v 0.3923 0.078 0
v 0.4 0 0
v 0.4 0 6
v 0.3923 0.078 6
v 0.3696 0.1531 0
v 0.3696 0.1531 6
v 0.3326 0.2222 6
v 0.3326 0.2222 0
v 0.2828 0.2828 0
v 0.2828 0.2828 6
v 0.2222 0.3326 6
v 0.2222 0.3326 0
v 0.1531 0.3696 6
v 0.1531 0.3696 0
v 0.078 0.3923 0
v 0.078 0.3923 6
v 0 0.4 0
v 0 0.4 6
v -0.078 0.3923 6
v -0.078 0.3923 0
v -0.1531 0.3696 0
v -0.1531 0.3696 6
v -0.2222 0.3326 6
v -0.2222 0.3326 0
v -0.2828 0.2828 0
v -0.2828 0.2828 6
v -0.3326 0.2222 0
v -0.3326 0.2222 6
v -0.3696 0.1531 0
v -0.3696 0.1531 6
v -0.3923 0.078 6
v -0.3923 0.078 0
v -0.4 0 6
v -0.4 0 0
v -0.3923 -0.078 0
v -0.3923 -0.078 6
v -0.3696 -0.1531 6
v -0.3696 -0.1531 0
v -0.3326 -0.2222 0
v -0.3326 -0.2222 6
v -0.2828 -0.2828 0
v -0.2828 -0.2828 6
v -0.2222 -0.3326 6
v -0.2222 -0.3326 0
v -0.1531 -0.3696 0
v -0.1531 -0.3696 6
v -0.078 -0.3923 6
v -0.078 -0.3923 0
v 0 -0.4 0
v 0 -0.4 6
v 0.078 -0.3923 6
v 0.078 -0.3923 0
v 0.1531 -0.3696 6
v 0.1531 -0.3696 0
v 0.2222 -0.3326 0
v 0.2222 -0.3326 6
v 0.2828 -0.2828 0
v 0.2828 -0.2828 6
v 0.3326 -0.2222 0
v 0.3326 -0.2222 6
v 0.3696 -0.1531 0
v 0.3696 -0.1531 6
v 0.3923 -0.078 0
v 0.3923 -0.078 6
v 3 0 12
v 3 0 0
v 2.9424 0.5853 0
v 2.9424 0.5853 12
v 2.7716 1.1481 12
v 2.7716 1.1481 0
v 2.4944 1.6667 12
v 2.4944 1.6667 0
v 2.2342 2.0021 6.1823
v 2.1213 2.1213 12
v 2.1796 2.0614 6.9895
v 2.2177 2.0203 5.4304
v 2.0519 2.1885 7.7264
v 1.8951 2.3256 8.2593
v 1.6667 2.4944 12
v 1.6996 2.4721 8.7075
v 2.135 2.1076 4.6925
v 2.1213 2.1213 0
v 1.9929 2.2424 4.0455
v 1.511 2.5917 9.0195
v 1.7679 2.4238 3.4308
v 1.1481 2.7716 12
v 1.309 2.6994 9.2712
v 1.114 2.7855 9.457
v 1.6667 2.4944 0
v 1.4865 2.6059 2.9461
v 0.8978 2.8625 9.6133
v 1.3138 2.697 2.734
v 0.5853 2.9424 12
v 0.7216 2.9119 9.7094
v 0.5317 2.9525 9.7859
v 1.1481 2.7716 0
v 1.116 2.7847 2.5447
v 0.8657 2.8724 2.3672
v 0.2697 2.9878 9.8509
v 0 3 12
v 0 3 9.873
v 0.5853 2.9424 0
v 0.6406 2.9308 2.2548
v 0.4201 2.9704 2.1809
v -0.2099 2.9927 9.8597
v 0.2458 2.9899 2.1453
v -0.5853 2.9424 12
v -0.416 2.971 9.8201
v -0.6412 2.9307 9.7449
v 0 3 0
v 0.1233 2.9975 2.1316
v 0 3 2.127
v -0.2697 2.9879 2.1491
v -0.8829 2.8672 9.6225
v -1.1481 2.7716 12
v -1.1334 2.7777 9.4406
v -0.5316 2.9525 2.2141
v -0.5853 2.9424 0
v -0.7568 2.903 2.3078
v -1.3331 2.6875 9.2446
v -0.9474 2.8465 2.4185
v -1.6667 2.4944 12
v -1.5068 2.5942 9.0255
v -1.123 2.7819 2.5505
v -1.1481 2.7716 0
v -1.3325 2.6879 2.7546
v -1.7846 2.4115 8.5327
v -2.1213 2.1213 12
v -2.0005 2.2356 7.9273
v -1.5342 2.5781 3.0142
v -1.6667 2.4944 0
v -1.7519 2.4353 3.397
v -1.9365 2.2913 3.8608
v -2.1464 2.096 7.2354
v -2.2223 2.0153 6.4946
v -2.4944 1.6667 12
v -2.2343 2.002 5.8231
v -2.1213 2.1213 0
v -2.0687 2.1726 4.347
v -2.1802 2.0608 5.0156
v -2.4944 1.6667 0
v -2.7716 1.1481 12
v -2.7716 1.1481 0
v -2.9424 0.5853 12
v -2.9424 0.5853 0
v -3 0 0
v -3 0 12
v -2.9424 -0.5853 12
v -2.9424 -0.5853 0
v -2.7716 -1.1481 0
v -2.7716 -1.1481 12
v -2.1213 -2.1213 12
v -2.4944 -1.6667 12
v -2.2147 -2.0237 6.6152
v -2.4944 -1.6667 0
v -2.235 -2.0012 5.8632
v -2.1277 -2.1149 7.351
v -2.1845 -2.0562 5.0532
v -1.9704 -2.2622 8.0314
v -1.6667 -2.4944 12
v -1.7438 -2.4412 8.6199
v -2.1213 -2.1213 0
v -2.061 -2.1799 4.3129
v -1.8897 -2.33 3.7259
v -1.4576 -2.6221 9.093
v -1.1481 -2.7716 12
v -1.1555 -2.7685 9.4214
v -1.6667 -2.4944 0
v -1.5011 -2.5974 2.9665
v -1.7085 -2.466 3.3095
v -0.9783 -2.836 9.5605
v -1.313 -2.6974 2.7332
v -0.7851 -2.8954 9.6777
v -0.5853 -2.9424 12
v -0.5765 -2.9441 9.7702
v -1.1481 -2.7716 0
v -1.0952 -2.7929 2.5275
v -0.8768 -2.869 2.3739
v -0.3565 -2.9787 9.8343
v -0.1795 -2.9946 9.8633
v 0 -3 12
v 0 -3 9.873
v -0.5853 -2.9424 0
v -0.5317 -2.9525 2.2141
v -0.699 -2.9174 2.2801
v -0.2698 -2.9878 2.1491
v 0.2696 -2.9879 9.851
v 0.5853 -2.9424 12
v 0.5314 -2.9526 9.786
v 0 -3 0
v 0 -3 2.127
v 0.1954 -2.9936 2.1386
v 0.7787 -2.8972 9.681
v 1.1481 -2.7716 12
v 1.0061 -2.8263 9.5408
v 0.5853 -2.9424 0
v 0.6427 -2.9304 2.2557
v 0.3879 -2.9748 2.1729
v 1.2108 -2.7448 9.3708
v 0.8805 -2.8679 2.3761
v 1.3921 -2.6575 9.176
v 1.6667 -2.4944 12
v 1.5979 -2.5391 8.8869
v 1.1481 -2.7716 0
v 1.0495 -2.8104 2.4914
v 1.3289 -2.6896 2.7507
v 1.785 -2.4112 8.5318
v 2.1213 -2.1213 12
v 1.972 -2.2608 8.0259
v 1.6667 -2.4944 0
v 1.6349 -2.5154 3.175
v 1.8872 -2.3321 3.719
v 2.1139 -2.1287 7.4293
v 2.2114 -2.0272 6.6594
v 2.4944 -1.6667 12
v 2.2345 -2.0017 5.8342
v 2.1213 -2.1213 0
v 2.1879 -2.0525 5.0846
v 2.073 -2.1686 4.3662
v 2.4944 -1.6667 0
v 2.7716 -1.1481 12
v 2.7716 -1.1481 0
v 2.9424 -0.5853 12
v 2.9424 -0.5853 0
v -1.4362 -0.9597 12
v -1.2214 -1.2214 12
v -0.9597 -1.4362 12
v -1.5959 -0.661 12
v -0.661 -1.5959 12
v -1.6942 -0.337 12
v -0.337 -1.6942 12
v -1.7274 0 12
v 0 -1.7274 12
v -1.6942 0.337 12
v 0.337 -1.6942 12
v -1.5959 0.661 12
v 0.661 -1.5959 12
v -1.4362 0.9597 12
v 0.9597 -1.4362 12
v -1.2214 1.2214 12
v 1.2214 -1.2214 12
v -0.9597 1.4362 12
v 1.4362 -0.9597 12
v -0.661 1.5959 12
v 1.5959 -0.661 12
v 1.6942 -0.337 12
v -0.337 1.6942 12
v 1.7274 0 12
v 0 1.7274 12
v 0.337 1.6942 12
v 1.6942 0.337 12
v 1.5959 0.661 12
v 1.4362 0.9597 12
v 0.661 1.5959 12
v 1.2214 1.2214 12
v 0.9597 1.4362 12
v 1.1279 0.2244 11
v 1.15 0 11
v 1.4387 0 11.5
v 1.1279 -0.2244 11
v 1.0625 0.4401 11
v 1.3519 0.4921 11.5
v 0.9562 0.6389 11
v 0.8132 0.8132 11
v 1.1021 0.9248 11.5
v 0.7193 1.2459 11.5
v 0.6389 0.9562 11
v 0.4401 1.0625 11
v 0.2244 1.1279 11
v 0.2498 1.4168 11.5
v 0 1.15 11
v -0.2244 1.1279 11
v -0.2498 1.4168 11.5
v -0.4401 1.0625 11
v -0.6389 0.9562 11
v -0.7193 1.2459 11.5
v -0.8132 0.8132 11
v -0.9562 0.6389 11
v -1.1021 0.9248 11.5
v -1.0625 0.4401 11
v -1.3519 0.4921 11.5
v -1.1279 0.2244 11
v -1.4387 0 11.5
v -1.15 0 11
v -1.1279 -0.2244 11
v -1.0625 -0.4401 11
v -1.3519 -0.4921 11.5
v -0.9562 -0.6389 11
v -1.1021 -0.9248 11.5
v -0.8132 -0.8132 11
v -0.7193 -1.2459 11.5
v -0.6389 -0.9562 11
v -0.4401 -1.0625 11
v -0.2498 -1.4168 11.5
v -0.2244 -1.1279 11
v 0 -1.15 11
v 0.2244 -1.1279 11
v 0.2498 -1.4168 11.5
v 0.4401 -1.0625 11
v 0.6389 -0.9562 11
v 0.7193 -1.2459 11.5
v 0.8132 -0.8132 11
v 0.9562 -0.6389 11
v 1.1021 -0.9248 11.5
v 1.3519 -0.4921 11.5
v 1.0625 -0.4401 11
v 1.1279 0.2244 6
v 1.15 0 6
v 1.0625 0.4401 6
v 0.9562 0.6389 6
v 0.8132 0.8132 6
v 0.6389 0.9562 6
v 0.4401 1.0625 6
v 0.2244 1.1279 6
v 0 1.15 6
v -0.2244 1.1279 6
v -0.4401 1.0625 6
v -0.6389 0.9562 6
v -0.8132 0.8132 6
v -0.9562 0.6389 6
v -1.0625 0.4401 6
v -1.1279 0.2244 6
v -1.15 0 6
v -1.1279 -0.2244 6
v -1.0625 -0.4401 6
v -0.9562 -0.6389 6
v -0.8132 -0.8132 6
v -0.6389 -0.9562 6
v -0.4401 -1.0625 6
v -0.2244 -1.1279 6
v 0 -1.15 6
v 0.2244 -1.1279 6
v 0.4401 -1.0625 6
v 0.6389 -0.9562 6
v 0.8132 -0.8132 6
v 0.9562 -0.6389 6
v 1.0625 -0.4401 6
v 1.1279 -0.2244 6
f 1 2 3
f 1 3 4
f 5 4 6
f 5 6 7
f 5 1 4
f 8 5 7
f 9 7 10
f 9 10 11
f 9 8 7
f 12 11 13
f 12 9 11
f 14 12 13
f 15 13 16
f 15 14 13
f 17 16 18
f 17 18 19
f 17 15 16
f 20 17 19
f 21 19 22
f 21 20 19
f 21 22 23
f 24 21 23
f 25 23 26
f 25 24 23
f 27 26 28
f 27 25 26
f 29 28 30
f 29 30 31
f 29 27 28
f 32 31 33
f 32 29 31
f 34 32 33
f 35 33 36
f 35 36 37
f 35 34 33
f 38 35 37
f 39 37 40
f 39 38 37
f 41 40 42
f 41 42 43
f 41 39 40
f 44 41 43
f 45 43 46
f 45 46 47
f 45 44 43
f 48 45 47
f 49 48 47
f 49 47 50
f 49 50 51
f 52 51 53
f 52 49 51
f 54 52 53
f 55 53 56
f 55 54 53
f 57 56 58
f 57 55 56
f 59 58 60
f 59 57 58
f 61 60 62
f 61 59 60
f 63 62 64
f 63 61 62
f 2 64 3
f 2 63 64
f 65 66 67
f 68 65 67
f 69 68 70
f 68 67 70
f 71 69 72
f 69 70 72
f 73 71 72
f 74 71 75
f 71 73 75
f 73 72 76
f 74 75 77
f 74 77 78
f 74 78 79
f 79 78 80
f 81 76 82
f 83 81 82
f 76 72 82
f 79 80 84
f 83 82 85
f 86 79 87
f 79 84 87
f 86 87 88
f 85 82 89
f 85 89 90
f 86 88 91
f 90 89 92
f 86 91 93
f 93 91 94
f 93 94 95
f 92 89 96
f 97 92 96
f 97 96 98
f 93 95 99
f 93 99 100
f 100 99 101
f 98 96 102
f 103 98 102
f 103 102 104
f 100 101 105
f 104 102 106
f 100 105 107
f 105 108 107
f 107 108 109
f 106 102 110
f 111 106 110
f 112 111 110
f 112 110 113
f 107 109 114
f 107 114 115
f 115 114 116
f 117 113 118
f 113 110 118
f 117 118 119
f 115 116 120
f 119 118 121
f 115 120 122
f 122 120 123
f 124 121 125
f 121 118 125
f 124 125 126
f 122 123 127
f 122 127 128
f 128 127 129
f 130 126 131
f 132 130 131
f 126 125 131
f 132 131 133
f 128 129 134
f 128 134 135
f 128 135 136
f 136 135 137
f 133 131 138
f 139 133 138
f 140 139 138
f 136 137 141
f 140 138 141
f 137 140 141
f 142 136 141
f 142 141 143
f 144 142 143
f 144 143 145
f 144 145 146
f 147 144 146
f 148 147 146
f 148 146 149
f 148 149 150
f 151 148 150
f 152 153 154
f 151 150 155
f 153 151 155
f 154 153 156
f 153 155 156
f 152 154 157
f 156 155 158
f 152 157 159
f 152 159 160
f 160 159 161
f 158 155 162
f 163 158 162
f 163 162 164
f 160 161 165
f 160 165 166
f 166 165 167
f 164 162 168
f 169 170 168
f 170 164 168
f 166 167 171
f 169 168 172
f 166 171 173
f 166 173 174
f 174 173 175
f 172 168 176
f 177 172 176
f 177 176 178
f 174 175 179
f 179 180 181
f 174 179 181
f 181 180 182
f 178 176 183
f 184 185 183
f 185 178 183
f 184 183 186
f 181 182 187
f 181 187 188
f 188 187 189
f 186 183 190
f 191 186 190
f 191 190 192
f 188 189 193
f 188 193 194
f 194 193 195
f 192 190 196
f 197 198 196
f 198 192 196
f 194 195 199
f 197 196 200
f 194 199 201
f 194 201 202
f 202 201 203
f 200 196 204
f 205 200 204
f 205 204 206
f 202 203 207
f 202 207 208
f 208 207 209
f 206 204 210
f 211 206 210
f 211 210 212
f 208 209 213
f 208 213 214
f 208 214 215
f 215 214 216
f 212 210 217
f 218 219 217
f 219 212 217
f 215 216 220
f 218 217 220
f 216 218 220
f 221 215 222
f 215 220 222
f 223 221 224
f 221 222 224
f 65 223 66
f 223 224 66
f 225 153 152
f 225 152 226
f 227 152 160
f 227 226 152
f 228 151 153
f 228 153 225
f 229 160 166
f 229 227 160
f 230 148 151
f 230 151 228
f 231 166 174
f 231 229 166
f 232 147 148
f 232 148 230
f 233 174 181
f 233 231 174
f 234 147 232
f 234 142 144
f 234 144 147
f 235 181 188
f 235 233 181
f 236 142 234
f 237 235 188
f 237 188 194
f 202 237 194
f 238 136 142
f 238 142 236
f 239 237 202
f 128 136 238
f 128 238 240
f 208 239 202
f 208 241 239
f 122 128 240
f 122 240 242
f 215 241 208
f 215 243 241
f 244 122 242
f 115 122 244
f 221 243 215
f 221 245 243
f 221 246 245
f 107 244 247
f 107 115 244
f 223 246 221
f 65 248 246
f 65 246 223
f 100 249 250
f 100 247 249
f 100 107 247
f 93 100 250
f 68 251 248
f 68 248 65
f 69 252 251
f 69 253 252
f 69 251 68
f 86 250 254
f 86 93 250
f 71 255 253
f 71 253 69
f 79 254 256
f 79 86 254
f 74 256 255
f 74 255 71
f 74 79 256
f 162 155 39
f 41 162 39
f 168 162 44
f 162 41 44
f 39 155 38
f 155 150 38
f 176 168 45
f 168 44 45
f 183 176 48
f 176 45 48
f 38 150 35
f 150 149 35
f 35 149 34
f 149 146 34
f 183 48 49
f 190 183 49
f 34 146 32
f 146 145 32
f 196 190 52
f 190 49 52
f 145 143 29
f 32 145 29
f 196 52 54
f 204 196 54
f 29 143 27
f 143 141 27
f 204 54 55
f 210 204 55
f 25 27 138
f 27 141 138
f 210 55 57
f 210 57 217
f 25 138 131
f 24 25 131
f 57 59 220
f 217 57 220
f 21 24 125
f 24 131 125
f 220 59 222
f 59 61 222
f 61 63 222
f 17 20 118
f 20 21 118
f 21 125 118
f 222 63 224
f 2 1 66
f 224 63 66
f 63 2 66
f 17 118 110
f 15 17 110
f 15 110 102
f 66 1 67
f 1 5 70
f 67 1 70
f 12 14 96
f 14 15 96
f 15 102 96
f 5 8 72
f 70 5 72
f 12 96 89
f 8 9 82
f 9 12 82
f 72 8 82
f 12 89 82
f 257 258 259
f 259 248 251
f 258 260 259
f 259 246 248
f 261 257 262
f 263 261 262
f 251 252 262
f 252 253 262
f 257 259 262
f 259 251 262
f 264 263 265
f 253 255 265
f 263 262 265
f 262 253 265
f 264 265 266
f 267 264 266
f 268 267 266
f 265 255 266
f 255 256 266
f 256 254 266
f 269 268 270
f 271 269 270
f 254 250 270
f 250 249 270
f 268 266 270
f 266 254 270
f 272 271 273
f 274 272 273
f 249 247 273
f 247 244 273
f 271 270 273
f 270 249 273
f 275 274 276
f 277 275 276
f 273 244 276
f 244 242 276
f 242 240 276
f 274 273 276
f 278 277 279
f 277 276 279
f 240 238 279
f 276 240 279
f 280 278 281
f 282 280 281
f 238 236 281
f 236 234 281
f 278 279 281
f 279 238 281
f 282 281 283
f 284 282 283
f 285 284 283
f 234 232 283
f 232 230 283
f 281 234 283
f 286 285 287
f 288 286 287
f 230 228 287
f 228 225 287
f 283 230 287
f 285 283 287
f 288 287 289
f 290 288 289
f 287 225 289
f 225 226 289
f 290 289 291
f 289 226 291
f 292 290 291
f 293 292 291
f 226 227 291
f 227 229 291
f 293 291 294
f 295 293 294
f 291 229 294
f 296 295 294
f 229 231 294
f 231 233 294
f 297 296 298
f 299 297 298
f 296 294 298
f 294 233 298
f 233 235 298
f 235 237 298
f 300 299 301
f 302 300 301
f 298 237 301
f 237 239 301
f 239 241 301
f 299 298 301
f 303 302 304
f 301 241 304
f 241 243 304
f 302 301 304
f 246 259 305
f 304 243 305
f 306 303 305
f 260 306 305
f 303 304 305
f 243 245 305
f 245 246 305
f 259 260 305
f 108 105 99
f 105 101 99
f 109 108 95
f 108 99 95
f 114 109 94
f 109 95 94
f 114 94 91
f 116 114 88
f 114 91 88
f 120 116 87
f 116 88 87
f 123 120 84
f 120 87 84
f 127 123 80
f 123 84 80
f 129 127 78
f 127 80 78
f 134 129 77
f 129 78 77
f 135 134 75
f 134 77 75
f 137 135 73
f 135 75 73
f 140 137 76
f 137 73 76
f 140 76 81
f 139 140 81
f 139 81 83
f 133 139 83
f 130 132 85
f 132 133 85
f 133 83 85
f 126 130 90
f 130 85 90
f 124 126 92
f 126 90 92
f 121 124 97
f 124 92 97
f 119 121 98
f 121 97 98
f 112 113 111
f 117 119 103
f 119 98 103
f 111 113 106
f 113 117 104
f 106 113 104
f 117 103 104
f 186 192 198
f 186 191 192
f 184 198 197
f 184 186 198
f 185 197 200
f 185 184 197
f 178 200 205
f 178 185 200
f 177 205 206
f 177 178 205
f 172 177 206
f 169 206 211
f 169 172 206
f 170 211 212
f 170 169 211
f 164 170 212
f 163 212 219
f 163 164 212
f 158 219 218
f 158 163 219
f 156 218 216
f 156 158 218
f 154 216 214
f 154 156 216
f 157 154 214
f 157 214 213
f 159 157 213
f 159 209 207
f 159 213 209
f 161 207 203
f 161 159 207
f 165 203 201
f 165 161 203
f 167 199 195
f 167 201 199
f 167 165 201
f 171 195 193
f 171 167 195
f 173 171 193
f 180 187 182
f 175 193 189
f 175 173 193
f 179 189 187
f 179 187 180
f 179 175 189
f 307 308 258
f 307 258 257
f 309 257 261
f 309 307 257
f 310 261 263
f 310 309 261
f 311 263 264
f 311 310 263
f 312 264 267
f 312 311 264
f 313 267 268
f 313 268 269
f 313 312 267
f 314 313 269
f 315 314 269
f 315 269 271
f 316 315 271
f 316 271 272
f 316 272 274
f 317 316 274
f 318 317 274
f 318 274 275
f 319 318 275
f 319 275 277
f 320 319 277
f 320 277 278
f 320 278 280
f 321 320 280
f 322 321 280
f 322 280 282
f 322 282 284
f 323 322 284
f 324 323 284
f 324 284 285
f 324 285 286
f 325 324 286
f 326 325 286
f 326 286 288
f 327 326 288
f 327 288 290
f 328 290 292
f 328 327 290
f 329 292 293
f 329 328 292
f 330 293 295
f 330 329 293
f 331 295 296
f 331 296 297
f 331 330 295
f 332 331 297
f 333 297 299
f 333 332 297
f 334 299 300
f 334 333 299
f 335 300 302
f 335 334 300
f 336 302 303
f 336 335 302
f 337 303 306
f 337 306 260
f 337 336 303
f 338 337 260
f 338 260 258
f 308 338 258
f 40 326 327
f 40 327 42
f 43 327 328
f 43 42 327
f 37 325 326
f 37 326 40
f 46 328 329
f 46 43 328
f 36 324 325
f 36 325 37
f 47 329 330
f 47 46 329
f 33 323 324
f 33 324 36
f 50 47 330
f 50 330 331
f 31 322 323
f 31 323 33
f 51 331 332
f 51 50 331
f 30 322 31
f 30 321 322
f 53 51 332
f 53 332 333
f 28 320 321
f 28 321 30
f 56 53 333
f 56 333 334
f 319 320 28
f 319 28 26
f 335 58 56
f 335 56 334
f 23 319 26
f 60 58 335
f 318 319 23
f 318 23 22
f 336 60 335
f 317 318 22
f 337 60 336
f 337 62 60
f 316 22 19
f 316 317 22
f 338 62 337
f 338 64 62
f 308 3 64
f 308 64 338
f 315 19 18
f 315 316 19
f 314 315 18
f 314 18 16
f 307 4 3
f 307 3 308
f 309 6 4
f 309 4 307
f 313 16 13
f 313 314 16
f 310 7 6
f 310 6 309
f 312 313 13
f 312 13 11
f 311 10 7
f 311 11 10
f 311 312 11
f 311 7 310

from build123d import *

# Parameters (mm, degrees)
F0_R          = 1.15
F0_R_2        = 0.4
F1_DEPTH      = 6
F0_R_3        = 3
F2_DEPTH      = 12
F3_SIZE2      = 0.5773502692
F3_SIZE       = 1
F4_R          = 8
F5_DEPTH      = 25
F5_DEPTH_BACK = 25


with BuildPart() as f1:
    # F0 (on Top) → F1 (new body)
    with BuildSketch(Plane.XY):
        Circle(F0_R)
        Circle(F0_R_2, mode=Mode.SUBTRACT)
    extrude(amount=F1_DEPTH)

    # F0 (on Top) → F2 (join)
    with BuildSketch(Plane.XY):
        Circle(F0_R_3)
        Circle(F0_R, mode=Mode.SUBTRACT)
    extrude(amount=F2_DEPTH)

    # F3
    f3_edges = [f1.edges().sort_by_distance(p)[0] for p in [
        (-1.15, 0, 12),
    ]]
    f3_side = f1.faces().sort_by_distance((-1.15, 0, 9))[0]
    chamfer(f3_edges, length=F3_SIZE, length2=F3_SIZE2, reference=f3_side)

    # F4 (on Right) → F5 (cut, two sides)
    with BuildSketch(Plane.YZ) as f5_sk:
        with Locations((10, 6)):
            Circle(F4_R)
        with Locations((-10, 6)):
            Circle(F4_R)
    extrude(amount=-F5_DEPTH, mode=Mode.SUBTRACT)
    extrude(f5_sk.sketch, amount=F5_DEPTH_BACK, mode=Mode.SUBTRACT)


solid = f1.part
